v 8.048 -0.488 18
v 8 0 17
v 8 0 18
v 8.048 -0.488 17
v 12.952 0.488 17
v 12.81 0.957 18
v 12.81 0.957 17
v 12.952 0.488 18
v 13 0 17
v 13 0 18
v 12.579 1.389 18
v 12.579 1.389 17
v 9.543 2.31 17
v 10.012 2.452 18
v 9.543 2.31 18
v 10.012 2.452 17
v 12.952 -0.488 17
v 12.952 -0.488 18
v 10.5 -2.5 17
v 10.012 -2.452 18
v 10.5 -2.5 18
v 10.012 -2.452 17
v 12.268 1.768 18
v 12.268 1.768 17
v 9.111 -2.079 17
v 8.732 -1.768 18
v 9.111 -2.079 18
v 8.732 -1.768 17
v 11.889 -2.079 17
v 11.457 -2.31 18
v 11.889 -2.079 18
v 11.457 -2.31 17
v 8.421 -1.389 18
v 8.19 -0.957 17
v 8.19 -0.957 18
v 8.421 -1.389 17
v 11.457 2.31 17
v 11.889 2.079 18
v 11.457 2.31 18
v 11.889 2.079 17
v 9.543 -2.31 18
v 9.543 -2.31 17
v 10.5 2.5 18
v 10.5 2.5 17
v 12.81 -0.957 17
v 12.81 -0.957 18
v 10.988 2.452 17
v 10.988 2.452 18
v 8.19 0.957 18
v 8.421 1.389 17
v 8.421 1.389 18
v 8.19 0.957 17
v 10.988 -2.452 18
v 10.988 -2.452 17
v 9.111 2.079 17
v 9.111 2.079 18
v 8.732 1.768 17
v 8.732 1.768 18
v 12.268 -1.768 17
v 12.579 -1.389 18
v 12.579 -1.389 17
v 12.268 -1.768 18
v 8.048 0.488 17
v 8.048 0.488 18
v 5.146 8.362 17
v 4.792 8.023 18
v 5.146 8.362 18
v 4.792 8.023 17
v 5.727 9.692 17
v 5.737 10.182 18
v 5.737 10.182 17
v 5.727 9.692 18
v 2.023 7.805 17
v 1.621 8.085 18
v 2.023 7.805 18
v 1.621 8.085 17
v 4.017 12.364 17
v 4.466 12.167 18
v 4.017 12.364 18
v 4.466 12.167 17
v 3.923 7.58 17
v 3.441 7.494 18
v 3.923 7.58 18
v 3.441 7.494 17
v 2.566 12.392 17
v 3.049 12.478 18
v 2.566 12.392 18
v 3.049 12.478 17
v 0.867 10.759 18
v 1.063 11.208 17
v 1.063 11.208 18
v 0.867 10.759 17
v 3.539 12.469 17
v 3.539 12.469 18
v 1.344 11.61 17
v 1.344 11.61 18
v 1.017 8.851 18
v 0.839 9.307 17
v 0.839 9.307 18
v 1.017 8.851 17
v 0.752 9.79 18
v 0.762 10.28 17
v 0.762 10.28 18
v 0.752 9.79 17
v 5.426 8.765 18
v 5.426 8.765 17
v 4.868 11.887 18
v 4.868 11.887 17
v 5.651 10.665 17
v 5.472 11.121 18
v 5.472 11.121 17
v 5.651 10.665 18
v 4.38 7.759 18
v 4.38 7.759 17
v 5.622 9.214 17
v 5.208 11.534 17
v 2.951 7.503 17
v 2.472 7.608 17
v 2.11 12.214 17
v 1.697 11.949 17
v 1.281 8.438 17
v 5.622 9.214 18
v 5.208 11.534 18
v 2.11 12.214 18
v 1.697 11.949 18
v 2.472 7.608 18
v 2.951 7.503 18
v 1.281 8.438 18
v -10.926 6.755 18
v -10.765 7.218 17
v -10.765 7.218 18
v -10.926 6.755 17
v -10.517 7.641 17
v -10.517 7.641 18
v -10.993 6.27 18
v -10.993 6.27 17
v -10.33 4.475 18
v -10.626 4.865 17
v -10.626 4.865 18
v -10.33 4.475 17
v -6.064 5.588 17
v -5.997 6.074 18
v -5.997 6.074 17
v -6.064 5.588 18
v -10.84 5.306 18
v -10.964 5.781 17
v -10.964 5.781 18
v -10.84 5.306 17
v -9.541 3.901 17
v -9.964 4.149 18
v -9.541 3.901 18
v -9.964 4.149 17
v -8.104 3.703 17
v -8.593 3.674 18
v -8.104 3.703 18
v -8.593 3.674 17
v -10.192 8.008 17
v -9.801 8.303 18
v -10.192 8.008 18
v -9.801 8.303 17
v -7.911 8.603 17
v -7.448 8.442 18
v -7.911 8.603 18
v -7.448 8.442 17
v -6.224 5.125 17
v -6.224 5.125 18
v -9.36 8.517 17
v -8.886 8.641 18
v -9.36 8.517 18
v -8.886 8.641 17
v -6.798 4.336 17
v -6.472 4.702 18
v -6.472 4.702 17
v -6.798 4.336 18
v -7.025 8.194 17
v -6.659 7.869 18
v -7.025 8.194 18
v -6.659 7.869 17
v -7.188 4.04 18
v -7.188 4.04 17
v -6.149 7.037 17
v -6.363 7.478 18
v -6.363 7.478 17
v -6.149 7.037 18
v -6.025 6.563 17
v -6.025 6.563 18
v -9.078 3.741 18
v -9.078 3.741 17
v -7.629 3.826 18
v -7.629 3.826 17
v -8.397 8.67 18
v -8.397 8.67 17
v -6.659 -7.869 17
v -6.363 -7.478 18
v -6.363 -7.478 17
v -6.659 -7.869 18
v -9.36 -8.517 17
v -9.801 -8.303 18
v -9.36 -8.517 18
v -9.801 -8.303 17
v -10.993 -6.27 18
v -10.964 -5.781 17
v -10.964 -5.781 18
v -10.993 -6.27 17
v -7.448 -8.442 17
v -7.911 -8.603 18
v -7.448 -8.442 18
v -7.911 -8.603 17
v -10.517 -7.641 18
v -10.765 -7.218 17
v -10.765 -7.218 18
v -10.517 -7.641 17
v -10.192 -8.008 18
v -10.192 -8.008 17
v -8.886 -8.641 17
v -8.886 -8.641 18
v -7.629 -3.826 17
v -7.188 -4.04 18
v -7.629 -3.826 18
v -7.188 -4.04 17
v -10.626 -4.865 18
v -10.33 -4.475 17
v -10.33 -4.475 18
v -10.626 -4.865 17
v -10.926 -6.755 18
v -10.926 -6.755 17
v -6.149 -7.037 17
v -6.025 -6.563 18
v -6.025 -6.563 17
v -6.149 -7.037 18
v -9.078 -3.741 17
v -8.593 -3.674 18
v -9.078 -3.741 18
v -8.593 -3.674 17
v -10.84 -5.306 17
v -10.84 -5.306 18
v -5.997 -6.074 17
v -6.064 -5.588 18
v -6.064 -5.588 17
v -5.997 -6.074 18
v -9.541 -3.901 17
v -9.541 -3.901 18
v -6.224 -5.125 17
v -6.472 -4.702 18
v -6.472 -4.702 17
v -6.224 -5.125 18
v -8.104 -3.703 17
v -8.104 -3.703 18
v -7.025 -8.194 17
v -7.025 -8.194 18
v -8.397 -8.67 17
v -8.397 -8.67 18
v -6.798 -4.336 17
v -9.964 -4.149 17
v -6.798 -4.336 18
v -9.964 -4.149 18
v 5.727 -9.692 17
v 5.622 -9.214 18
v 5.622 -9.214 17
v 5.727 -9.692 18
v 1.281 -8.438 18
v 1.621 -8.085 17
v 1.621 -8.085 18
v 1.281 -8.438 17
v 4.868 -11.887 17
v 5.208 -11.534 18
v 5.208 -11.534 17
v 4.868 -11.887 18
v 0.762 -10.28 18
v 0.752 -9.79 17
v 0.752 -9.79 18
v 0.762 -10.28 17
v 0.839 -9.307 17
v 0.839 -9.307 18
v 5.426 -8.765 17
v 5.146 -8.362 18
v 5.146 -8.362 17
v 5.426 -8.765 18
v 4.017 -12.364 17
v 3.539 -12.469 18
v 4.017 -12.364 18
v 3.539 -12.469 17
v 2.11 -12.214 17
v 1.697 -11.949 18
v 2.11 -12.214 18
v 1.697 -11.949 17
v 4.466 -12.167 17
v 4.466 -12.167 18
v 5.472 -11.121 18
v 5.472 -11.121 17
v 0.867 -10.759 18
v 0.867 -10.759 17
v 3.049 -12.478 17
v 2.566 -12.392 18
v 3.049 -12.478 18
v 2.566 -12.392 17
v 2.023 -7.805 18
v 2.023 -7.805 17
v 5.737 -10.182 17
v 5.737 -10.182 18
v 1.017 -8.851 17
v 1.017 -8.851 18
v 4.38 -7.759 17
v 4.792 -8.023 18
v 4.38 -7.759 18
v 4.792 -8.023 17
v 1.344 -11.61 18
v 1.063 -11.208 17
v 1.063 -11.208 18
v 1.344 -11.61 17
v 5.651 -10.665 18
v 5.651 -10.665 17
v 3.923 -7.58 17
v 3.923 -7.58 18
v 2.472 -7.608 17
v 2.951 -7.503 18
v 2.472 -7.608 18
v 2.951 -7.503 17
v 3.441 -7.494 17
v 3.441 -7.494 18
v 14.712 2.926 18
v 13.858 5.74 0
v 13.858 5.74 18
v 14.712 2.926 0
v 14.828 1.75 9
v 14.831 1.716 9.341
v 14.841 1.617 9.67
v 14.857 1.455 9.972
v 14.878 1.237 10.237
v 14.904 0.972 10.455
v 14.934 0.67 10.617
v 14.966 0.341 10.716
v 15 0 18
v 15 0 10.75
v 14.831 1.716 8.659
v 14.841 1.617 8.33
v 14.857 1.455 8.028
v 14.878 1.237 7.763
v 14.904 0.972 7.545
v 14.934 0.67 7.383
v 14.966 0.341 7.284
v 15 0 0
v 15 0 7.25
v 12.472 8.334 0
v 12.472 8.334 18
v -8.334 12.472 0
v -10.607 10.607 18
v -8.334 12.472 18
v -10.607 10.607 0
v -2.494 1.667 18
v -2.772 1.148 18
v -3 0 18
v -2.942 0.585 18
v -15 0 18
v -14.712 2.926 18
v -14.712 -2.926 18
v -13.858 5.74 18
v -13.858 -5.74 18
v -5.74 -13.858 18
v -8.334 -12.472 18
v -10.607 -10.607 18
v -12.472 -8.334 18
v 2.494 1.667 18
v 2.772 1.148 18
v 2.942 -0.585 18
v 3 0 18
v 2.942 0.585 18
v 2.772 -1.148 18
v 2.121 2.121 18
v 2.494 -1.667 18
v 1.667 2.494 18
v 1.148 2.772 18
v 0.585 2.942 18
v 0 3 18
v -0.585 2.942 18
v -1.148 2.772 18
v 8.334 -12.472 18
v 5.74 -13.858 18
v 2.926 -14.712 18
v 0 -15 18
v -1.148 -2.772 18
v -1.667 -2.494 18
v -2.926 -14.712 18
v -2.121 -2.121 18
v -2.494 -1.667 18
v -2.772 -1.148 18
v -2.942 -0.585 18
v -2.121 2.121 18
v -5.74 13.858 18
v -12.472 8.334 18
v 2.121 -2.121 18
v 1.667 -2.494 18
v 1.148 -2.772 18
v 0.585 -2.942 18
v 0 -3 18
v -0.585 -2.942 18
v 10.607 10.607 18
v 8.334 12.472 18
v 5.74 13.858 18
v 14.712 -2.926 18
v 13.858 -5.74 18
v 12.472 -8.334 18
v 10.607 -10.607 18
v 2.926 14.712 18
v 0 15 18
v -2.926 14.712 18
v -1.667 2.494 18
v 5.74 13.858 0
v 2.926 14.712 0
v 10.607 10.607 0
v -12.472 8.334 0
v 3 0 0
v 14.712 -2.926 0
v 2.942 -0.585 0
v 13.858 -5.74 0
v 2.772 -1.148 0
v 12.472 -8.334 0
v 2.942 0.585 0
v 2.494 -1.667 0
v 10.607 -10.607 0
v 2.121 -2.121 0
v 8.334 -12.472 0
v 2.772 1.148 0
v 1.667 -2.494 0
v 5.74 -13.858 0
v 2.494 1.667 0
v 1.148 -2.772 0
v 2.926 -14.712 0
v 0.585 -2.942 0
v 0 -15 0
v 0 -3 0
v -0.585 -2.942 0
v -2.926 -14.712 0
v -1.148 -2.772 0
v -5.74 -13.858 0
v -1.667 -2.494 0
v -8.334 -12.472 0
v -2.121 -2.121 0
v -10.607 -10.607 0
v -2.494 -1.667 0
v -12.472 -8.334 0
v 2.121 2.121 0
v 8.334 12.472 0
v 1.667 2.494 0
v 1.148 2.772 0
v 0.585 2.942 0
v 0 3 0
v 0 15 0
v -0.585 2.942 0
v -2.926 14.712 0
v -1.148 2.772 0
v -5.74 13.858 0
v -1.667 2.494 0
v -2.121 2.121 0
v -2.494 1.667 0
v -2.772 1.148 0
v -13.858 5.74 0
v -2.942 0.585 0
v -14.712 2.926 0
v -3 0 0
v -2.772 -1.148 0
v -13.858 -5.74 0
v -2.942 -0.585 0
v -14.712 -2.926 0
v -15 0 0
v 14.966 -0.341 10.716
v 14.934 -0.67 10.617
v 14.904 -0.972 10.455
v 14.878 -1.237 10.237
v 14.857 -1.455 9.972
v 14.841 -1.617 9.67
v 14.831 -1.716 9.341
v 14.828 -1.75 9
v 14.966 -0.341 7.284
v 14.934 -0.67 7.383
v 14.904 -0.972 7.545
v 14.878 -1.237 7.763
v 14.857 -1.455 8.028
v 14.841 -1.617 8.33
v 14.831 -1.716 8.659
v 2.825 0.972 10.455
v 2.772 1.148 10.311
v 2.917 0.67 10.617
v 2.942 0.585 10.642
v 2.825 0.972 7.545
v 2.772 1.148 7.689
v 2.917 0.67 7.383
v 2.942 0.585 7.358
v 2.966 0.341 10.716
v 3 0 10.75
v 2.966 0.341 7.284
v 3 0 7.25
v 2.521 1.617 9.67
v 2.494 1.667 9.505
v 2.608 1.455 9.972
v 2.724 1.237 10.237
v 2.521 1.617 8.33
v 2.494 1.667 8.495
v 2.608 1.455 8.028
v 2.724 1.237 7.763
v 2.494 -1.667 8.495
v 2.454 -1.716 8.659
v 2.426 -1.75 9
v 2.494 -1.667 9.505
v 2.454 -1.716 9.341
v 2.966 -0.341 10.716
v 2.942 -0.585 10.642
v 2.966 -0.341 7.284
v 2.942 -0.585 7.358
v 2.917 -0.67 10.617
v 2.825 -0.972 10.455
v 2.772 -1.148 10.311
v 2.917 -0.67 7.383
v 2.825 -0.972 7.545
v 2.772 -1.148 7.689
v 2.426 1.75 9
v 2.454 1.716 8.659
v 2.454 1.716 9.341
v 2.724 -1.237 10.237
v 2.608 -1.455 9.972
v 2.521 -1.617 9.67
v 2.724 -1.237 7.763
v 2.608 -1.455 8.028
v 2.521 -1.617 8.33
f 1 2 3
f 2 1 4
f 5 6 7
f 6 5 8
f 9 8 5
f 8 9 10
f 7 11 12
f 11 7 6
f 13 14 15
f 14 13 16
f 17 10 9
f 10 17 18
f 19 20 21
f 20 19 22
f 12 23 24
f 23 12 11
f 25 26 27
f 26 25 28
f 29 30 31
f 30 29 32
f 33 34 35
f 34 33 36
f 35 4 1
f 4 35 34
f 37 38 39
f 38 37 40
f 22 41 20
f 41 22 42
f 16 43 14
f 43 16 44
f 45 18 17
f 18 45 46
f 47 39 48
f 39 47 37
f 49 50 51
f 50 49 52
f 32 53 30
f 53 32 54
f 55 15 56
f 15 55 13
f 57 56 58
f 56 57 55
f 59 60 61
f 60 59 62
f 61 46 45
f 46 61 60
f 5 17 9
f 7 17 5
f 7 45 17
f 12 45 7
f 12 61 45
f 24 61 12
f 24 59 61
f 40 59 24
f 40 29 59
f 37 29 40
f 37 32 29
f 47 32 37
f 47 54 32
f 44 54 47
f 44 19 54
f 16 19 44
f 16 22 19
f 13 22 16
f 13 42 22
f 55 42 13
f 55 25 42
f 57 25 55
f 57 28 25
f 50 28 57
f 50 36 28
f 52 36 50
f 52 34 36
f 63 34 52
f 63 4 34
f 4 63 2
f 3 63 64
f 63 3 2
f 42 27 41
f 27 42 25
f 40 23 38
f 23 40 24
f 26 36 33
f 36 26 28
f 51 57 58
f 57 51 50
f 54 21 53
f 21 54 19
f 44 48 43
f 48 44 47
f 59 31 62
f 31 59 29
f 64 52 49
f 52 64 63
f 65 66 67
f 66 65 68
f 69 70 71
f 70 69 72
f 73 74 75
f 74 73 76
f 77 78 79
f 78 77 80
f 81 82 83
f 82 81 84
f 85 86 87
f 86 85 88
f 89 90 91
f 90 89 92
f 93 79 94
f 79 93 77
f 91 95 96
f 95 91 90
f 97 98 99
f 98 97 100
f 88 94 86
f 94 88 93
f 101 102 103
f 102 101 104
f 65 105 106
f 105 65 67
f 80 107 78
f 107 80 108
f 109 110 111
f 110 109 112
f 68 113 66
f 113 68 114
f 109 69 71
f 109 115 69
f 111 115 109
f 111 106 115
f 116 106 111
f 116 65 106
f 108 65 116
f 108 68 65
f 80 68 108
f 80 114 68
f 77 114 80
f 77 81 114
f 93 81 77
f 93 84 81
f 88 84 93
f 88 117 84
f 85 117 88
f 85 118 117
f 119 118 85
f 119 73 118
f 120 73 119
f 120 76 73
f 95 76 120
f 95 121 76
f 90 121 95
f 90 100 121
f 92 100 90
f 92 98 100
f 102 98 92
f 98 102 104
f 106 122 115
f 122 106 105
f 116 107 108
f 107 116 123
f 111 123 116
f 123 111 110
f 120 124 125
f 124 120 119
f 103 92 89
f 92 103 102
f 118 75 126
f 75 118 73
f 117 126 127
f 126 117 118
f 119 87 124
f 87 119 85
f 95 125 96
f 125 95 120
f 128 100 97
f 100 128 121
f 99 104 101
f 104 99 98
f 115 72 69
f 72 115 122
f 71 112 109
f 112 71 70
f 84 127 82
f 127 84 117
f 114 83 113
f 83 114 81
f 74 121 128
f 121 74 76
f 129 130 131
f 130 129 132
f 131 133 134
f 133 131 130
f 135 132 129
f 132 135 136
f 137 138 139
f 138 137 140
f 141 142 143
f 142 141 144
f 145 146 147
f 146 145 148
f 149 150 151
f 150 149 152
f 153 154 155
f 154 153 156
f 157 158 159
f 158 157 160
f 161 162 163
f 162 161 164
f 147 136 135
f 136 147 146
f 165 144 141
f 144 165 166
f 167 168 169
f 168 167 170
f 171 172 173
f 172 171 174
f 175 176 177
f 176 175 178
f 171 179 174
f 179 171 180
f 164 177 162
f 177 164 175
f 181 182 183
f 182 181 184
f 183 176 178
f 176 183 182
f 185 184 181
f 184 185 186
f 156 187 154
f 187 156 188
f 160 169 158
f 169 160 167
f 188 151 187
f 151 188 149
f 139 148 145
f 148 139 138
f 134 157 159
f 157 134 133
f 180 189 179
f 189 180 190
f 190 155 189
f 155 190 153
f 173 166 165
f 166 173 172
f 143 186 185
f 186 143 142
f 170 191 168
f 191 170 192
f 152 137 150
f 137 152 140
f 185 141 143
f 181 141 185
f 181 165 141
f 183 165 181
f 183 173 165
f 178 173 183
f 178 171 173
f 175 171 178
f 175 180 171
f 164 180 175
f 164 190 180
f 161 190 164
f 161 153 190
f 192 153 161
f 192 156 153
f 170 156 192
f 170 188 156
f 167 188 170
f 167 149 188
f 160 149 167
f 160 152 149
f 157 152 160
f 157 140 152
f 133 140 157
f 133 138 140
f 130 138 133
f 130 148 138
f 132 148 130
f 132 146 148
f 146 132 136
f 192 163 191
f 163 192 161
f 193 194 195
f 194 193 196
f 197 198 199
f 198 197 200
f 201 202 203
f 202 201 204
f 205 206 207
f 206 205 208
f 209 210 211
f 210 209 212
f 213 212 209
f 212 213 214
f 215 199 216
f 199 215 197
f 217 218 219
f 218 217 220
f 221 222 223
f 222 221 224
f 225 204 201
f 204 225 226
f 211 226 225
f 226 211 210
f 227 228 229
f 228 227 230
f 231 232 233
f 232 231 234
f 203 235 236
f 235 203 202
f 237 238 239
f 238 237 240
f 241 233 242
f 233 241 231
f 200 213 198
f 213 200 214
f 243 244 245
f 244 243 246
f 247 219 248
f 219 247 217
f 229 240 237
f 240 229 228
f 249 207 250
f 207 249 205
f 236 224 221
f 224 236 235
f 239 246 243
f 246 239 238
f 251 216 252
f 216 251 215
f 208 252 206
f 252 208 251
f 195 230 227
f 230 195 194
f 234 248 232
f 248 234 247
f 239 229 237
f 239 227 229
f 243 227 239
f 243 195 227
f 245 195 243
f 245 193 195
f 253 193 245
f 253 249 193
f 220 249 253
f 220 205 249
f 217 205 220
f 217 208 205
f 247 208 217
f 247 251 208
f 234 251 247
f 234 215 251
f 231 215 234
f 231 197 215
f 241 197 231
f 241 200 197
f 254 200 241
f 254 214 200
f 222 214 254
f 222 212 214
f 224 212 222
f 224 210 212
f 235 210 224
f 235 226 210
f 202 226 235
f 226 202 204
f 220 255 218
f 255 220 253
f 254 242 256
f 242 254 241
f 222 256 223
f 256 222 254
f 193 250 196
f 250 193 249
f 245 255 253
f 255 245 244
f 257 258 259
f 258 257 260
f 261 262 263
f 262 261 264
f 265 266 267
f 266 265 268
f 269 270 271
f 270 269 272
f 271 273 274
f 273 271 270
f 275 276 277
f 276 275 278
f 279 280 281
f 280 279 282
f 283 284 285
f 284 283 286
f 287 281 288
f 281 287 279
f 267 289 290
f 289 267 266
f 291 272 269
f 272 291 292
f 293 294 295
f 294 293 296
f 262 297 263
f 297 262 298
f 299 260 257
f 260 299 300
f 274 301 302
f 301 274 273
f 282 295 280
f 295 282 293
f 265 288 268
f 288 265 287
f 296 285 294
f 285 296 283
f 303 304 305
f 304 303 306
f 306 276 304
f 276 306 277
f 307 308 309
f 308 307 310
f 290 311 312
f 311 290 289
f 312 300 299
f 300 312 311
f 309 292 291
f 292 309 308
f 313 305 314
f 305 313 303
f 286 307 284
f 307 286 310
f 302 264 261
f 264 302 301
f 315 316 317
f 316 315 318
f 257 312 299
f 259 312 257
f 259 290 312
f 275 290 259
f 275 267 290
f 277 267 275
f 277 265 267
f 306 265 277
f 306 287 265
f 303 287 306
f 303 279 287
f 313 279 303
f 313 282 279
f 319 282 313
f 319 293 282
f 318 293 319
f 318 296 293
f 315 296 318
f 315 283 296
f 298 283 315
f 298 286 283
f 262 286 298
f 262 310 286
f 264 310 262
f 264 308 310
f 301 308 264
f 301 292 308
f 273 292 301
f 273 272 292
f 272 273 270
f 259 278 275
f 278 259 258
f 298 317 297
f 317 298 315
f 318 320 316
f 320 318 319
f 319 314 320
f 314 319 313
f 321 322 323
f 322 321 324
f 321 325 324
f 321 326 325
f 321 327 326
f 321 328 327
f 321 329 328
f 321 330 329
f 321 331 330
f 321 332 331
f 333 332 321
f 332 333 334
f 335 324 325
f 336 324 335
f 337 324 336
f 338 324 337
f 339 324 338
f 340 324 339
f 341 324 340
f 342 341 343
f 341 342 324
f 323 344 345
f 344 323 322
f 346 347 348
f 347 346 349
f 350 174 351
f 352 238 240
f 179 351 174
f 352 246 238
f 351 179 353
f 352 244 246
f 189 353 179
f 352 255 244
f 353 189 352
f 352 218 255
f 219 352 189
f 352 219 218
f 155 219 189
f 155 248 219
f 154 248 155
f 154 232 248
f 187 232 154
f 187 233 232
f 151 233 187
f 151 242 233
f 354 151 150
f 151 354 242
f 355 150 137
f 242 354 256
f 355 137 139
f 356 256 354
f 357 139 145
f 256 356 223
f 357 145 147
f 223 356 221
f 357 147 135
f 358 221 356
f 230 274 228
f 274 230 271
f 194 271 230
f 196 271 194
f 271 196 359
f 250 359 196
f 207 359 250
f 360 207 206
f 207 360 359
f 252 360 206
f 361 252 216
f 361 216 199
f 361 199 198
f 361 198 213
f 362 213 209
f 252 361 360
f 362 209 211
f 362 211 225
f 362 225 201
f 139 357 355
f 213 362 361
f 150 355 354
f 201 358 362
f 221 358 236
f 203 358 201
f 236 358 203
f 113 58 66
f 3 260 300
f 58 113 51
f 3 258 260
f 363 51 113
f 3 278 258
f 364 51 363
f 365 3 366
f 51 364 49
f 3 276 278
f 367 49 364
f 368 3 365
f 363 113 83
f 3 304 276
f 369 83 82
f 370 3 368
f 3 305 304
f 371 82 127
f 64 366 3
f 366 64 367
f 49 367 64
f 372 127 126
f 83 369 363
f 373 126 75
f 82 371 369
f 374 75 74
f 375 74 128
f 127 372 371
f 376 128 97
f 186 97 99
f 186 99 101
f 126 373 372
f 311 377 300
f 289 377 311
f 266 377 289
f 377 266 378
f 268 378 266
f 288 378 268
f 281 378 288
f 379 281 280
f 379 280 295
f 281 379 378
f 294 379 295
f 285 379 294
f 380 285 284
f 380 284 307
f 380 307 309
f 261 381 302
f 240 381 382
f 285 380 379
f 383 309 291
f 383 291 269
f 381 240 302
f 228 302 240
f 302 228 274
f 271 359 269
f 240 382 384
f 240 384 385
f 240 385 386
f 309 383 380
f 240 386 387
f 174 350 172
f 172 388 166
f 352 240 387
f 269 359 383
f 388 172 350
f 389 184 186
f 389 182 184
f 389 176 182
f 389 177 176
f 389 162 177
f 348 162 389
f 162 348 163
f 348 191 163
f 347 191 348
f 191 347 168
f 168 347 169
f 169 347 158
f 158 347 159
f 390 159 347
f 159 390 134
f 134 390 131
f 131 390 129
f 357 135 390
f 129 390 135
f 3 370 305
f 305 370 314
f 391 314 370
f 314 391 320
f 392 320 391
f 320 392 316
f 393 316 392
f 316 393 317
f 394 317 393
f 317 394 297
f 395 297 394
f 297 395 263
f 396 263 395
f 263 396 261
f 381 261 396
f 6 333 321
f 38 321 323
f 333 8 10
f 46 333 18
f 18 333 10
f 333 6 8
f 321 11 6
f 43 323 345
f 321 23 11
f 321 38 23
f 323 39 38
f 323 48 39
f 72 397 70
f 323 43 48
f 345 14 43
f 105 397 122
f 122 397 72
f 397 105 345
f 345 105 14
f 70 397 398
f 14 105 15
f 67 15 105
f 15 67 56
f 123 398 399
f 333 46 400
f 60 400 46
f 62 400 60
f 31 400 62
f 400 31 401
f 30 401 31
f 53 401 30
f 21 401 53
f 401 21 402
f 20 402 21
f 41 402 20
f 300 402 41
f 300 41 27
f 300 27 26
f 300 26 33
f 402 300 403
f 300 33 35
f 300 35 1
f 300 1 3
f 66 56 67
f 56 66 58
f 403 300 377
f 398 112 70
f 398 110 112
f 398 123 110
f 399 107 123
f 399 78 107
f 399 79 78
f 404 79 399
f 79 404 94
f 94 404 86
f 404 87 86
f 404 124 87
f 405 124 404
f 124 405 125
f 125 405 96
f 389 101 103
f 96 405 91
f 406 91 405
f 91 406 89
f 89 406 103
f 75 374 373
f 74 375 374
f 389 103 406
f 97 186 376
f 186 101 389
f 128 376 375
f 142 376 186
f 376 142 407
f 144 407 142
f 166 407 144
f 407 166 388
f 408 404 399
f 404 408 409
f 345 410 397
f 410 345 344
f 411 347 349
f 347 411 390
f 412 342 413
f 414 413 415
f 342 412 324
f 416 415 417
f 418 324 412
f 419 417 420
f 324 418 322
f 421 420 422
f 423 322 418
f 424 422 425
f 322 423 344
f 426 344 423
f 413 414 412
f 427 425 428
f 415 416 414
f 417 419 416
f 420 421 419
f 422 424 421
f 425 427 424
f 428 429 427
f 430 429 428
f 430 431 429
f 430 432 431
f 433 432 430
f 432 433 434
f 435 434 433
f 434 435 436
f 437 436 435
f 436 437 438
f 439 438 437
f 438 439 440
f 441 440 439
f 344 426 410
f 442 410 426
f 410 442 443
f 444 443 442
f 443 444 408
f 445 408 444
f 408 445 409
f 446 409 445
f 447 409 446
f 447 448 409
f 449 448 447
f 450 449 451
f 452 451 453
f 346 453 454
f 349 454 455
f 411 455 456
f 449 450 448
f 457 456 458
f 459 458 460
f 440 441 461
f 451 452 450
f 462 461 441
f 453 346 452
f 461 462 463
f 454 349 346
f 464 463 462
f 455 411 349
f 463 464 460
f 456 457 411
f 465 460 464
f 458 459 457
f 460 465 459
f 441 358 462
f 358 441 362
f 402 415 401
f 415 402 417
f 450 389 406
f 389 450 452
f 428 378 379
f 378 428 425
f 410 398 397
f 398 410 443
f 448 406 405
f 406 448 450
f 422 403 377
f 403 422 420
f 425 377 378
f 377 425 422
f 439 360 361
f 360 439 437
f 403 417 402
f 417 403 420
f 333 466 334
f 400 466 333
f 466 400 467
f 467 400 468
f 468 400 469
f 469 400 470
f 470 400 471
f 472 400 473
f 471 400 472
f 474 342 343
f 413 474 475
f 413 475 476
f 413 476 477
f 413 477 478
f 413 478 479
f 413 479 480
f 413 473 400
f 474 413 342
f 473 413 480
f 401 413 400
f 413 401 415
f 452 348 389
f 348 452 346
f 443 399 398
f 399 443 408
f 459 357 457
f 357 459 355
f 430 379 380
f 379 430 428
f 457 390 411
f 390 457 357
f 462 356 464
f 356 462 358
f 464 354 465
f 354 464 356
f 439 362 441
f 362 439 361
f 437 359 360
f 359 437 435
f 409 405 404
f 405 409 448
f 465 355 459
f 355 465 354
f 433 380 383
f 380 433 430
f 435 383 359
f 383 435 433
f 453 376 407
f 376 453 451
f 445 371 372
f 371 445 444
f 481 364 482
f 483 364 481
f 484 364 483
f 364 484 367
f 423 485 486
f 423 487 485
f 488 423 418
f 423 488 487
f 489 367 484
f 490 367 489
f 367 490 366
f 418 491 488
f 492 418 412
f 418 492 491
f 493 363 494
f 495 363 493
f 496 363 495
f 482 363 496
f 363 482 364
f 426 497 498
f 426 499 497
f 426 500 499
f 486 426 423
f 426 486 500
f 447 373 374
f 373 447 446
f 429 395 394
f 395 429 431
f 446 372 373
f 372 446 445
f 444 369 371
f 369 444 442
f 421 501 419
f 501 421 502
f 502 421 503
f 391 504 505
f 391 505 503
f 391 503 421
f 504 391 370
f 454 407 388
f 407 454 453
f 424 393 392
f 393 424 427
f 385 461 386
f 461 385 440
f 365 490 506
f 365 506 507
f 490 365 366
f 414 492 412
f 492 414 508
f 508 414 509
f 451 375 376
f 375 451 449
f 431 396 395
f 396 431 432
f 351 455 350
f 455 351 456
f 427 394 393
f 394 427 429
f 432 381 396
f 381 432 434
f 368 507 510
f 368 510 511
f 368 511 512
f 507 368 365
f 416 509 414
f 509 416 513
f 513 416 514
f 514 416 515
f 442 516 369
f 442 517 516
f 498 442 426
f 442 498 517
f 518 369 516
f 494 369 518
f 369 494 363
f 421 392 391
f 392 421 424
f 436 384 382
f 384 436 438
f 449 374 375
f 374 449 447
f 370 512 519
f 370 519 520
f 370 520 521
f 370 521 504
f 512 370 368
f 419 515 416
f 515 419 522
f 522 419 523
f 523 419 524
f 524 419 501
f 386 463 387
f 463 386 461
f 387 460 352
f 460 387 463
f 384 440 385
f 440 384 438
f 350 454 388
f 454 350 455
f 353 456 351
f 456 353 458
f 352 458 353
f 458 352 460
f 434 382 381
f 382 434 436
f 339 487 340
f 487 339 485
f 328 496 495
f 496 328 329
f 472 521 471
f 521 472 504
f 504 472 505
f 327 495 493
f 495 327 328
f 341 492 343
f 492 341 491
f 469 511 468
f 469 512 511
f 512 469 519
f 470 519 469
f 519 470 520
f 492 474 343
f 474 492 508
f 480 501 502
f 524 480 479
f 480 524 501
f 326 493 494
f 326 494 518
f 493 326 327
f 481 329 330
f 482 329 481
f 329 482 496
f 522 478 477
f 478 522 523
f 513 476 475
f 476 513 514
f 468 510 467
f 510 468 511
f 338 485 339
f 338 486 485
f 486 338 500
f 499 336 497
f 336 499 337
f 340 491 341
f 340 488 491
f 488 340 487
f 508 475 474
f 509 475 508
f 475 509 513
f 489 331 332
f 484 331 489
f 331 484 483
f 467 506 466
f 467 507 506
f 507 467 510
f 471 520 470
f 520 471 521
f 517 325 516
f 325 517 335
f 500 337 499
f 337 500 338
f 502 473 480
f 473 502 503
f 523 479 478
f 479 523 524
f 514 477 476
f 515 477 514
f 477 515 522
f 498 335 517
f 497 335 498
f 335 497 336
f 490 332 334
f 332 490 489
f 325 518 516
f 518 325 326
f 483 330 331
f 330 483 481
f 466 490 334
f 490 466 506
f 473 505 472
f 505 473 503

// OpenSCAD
$fn = 32;

// ----------------------------------------------------------------------
// Control knob: dimpled knob
// ----------------------------------------------------------------------

// --- parameters (mm) ---
dimp_d = 5;               // finger dimple diameter
n_dimp = 5;               // number of dimples
dimp_r = 10.5;            // dimple ring radius
knob_d = 30;              // knob body diameter
knob_h = 18;              // knob body height
bore_d = 6;               // shaft bore diameter
set_d = 3.5;              // set screw bore diameter

dimp_step = 360 / n_dimp;  // dimple angular step

difference() {
  cylinder(h = knob_h, d = knob_d);
  translate([0, 0, -1]) cylinder(h = knob_h + 2, d = bore_d);
  translate([-1, 0, knob_h / 2]) rotate([0, 90, 0])
    cylinder(h = knob_d / 2 + bore_d / 2 + 2, d = set_d);  for (i = [0 : n_dimp - 1])
    rotate([0, 0, i * dimp_step])
      translate([dimp_r, 0, knob_h - 1])
        cylinder(h = 2, d = dimp_d);
}
